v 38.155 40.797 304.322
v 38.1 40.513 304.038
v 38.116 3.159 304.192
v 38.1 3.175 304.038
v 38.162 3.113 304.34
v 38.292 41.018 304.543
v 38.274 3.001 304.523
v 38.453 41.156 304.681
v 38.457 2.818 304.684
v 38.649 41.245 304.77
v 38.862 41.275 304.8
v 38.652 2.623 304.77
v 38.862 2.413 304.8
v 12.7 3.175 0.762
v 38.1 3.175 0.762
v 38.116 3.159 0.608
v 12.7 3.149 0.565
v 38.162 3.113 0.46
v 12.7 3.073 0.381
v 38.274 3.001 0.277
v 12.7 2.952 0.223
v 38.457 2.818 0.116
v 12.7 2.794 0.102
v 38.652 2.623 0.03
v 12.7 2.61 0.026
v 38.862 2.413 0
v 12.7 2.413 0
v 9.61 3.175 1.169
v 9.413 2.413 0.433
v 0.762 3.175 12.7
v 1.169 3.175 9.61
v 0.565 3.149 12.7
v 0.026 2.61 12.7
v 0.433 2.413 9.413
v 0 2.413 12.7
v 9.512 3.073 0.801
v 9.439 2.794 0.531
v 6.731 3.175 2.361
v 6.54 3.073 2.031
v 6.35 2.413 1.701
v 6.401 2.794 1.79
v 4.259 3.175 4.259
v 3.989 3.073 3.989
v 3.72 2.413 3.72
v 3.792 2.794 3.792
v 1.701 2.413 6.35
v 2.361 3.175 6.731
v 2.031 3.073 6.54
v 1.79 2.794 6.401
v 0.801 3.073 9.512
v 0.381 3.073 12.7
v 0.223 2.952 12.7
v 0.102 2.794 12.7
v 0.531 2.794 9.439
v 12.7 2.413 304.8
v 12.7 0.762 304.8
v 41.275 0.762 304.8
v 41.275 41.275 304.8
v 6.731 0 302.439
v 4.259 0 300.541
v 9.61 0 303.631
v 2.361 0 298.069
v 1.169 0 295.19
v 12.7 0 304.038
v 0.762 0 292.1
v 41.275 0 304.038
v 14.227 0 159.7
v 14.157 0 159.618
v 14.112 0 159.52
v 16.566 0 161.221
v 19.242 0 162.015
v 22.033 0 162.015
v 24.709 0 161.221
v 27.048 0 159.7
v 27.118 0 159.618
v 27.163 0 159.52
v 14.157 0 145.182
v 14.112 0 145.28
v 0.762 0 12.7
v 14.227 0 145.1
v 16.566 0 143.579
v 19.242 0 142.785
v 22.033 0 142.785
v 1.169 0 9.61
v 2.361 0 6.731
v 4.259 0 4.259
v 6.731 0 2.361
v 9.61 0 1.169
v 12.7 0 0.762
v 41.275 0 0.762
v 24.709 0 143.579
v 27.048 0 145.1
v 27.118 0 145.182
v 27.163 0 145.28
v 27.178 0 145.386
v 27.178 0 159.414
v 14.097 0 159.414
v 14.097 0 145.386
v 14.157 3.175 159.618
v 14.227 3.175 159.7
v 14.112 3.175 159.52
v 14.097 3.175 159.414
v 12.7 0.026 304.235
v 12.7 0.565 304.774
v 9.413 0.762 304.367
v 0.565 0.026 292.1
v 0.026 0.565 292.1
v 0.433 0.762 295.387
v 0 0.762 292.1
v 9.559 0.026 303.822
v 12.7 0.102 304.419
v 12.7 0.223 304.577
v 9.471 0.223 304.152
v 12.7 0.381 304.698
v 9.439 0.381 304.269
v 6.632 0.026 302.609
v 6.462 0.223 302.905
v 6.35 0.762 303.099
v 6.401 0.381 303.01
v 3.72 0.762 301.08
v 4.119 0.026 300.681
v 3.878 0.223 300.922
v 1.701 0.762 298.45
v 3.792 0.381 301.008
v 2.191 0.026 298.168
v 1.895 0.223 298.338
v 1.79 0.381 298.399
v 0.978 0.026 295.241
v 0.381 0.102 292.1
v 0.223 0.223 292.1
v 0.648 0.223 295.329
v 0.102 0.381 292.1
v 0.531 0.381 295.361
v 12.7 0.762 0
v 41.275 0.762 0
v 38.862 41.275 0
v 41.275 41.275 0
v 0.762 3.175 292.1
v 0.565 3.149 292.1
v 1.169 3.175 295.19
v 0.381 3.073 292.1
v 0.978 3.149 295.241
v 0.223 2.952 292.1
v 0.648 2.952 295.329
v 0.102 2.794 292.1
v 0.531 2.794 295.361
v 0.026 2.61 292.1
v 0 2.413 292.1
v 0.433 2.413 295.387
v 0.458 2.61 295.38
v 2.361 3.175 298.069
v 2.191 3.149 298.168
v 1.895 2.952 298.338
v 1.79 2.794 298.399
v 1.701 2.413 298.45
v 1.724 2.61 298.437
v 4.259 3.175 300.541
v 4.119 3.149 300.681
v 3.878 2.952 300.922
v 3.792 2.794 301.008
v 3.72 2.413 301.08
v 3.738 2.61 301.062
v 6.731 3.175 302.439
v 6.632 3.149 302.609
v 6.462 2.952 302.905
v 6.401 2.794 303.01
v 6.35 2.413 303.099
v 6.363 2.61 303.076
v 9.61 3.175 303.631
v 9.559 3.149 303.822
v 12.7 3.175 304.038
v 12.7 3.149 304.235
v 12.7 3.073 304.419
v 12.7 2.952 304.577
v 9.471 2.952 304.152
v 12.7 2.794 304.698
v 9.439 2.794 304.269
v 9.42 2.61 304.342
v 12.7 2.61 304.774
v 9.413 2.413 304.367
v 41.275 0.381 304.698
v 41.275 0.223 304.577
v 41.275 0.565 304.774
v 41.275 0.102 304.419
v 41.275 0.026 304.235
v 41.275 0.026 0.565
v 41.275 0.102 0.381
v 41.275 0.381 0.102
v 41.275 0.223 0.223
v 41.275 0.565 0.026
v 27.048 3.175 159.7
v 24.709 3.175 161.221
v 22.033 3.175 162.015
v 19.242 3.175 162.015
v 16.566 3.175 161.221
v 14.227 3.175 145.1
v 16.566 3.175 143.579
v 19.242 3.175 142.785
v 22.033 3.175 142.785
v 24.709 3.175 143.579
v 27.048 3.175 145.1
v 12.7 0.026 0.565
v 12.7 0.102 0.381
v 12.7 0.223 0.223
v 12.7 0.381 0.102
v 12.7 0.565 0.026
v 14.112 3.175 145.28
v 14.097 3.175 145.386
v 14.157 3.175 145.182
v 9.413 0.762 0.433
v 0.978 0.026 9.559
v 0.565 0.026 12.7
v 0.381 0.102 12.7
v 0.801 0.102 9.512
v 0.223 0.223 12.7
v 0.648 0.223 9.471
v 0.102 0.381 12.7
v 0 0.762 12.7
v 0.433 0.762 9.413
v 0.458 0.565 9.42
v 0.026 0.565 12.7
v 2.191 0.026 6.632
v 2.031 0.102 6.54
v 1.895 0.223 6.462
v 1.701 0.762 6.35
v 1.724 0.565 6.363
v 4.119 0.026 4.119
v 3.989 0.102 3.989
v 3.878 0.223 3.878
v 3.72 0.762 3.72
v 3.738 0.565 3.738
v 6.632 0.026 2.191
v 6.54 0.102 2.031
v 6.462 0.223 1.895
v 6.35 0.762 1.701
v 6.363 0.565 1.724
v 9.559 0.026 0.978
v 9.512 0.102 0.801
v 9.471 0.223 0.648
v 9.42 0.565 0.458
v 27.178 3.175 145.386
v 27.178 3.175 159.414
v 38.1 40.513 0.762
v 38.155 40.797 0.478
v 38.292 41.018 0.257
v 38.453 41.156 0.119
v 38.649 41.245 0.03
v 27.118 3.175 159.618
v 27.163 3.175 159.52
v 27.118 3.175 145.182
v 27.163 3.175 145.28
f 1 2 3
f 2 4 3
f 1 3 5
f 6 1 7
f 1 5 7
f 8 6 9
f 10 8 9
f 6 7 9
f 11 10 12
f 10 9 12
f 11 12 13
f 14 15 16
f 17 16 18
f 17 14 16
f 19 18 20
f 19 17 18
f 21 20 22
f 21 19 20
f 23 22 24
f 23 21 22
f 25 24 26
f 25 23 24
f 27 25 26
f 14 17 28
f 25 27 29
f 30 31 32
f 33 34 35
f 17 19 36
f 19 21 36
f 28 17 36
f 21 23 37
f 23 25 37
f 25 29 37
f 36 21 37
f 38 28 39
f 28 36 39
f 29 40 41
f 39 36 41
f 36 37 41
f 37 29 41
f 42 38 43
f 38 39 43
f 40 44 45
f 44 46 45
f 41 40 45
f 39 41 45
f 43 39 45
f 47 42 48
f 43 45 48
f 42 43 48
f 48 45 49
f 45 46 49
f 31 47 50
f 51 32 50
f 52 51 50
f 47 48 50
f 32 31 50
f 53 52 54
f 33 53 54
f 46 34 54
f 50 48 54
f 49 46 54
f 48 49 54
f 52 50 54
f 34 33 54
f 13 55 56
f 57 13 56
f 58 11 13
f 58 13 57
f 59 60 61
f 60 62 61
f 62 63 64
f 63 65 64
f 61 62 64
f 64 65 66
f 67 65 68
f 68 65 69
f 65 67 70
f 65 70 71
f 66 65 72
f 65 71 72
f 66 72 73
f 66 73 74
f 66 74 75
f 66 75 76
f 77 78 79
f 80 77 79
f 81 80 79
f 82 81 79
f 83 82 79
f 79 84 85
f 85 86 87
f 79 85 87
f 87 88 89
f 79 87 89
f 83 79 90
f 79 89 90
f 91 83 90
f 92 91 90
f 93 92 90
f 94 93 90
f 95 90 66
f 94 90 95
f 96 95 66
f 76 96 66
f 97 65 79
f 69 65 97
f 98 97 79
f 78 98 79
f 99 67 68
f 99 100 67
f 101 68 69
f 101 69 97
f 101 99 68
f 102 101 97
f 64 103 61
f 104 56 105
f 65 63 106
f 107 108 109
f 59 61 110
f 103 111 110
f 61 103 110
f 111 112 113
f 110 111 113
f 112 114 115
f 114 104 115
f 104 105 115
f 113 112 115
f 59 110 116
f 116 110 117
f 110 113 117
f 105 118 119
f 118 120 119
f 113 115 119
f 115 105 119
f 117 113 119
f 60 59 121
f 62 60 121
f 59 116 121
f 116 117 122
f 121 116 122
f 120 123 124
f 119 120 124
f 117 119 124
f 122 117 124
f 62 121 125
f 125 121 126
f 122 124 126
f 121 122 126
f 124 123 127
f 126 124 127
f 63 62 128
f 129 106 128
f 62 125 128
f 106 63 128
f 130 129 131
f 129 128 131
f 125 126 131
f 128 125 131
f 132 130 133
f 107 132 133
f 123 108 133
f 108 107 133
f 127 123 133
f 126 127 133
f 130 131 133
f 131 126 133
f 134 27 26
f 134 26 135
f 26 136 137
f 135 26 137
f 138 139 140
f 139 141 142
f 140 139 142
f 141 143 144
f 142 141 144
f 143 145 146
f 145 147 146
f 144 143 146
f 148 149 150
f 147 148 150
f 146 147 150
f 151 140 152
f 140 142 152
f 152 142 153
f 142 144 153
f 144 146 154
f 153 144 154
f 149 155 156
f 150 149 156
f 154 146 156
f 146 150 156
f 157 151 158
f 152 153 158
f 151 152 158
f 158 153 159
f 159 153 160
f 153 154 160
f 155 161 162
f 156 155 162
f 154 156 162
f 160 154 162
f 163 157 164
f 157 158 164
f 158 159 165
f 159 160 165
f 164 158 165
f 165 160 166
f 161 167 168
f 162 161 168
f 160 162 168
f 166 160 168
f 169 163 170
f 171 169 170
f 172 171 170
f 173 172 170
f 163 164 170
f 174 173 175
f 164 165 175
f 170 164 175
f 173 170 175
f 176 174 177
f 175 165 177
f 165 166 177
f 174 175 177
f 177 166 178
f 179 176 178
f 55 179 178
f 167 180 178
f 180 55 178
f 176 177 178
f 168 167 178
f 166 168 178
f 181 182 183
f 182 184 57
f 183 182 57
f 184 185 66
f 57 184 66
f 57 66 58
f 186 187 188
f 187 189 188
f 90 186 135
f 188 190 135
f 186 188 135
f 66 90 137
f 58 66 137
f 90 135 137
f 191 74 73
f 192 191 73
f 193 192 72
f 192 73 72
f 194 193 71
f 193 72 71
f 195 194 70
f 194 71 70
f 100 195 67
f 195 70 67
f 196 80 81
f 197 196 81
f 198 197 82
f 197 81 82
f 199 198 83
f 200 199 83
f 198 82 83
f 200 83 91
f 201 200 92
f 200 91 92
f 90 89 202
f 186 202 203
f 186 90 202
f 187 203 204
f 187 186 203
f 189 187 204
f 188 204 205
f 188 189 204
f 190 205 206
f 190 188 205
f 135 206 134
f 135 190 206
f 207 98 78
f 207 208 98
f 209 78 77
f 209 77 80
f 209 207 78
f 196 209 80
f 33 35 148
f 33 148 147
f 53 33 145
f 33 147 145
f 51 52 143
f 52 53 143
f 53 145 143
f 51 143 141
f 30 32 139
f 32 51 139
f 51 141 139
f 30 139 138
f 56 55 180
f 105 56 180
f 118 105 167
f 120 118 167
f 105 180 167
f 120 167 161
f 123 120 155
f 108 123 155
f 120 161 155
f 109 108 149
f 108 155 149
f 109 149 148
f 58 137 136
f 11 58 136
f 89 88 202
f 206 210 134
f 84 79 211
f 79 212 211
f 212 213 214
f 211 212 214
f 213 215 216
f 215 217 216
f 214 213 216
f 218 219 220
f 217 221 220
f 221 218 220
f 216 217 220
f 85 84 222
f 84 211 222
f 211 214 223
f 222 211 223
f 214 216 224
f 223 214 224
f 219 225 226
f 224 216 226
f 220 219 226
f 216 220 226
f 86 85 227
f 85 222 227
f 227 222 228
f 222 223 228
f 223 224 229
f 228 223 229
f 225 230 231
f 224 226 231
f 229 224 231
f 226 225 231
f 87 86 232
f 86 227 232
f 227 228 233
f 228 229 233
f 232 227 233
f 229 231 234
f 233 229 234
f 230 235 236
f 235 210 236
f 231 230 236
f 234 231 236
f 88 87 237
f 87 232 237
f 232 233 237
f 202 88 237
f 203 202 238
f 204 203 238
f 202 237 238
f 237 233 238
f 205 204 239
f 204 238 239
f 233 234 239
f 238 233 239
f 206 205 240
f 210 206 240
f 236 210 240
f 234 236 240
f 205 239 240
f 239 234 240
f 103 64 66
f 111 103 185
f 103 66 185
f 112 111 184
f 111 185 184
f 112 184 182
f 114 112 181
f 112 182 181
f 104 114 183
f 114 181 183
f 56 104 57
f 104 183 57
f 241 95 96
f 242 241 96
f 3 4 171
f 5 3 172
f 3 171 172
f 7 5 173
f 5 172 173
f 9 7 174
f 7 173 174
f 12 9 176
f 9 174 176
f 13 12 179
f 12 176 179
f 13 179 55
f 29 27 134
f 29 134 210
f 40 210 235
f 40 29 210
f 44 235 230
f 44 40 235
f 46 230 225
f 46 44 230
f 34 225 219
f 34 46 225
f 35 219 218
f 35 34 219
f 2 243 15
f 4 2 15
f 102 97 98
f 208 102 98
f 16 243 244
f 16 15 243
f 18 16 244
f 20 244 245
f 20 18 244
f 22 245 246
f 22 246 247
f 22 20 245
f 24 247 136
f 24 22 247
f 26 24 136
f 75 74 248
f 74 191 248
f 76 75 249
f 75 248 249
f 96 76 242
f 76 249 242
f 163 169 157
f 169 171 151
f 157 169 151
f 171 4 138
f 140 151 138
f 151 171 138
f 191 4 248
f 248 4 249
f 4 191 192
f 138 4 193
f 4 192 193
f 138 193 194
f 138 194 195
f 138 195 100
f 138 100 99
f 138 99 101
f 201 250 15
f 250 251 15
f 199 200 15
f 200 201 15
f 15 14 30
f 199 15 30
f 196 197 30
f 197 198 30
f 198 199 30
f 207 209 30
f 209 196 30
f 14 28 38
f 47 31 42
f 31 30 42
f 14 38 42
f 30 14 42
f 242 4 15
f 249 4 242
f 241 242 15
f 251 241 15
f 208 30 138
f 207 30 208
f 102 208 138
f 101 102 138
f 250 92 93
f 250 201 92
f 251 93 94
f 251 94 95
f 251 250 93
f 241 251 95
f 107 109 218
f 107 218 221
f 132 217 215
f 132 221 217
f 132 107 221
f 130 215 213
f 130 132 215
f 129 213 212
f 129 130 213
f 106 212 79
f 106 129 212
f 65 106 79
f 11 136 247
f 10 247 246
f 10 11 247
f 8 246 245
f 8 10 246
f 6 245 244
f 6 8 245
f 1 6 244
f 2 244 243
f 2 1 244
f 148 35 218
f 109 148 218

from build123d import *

# Parameters (mm, degrees)
F1_DEPTH     = 304.8
F2_R         = 0.762
F5_DEPTH     = 25.4
F6_R         = 0.381
F7_T1_DEPTH  = 3.175
F7_T4_ANGLE  = 90
F7_T6_ANGLE  = 90
F7_T8_ANGLE  = 90
F7_T10_ANGLE = 90


# Not quite as in the source:
# - a fillet or chamfer that OpenCascade refuses, or shapes differently, is made with other operations: its cross-section is extruded or revolved along the edge and cut away or added


with BuildPart() as f1:
    # F0 (on Top) → F1 (new body)
    with BuildSketch(Plane.XY):
        Polygon((0, 3.175), (0, 0), (41.275, 0), (41.275, 41.275), (38.1, 41.275), (38.1, 3.175), align=None)
    extrude(amount=F1_DEPTH)

    # F2
    f2_edges = [f1.edges().sort_by_distance(p)[0] for p in [
        (0, 0, 152.4),
        (20.6375, 0, 304.8),
        (20.6375, 0, 0),
        (38.1, 22.225, 304.8),
        (19.05, 3.175, 304.8),
        (0, 3.175, 152.4),
        (19.05, 3.175, 0),
        (38.1, 22.225, 0),
        (38.1, 41.275, 152.4),
    ]]
    fillet(f2_edges, radius=F2_R)

    # F4 (on face) → F5 (cut)
    with BuildSketch(Plane.XZ):
        with BuildLine():
            ThreePointArc((27.178, 159.5842048969), (20.6375, 162.1155), (14.097, 159.5842048969))
            Line((14.097, 159.5842048969), (14.097, 145.2157951031))
            ThreePointArc((14.097, 145.2157951031), (20.6375, 142.6845), (27.178, 145.2157951031))
            Line((27.178, 145.2157951031), (27.178, 159.5842048969))
        make_face()
    extrude(amount=-F5_DEPTH, mode=Mode.SUBTRACT)

    # F6
    f6_edges = [f1.edges().sort_by_distance(p)[0] for p in [
        (14.097, 1.5875, 145.215795),
        (14.097, 1.5875, 159.584205),
        (27.178, 1.5875, 159.584205),
        (27.178, 1.5875, 145.215795),
    ]]
    fillet(f6_edges, radius=F6_R)

    # F7: fillet of radius 12.7 on 2 edges, made by hand

    # F7_s2 → F7_t1 (cut)
    with BuildSketch(Plane.XZ.offset(-3.175)):
        with BuildLine():
            ThreePointArc((12.7, 304.8), (3.7197438789, 301.0802561211), (0, 292.1))
            Line((0, 292.1), (0, 304.8))
            Line((0, 304.8), (12.7, 304.8))
        make_face()
        with BuildLine():
            ThreePointArc((12.7, 0), (3.7197438789, 3.7197438789), (0, 12.7))
            Line((0, 12.7), (0, 0))
            Line((0, 0), (12.7, 0))
        make_face()
    extrude(amount=F7_T1_DEPTH, mode=Mode.SUBTRACT)

    # F7_s3 → F7_t4 (revolve, cut)
    with BuildSketch(Plane.YZ.offset(12.7)):
        with BuildLine():
            ThreePointArc((3.175, 0.762), (2.9518153673, 0.2231846327), (2.413, 0))
            Line((2.413, 0), (3.175, 0))
            Line((3.175, 0), (3.175, 0.762))
        make_face()
    revolve(axis=Axis((12.7, 3.175, 12.7), (0, 1, 0)), revolution_arc=F7_T4_ANGLE, mode=Mode.SUBTRACT)

    # F7_s5 → F7_t6 (revolve, cut)
    with BuildSketch(Plane.XY.offset(12.7)):
        with BuildLine():
            ThreePointArc((0.762, 0), (0.2231846327, 0.2231846327), (0, 0.762))
            Line((0, 0.762), (0, 0))
            Line((0, 0), (0.762, 0))
        make_face()
    revolve(axis=Axis((12.7, 0, 12.7), (0, -1, 0)), revolution_arc=F7_T6_ANGLE, mode=Mode.SUBTRACT)

    # F7_s7 → F7_t8 (revolve, cut)
    with BuildSketch(Plane.XY.offset(292.1)):
        with BuildLine():
            ThreePointArc((0.762, 3.175), (0.2231846327, 2.9518153673), (0, 2.413))
            Line((0, 2.413), (0, 3.175))
            Line((0, 3.175), (0.762, 3.175))
        make_face()
    revolve(axis=Axis((12.7, 3.175, 292.1), (0, 1, 0)), revolution_arc=F7_T8_ANGLE, mode=Mode.SUBTRACT)

    # F7_s9 → F7_t10 (revolve, cut)
    with BuildSketch(Plane.YZ.offset(12.7)):
        with BuildLine():
            ThreePointArc((0, 304.038), (0.2231846327, 304.5768153673), (0.762, 304.8))
            Line((0.762, 304.8), (0, 304.8))
            Line((0, 304.8), (0, 304.038))
        make_face()
    revolve(axis=Axis((12.7, 0, 292.1), (0, -1, 0)), revolution_arc=F7_T10_ANGLE, mode=Mode.SUBTRACT)


solid = f1.part
